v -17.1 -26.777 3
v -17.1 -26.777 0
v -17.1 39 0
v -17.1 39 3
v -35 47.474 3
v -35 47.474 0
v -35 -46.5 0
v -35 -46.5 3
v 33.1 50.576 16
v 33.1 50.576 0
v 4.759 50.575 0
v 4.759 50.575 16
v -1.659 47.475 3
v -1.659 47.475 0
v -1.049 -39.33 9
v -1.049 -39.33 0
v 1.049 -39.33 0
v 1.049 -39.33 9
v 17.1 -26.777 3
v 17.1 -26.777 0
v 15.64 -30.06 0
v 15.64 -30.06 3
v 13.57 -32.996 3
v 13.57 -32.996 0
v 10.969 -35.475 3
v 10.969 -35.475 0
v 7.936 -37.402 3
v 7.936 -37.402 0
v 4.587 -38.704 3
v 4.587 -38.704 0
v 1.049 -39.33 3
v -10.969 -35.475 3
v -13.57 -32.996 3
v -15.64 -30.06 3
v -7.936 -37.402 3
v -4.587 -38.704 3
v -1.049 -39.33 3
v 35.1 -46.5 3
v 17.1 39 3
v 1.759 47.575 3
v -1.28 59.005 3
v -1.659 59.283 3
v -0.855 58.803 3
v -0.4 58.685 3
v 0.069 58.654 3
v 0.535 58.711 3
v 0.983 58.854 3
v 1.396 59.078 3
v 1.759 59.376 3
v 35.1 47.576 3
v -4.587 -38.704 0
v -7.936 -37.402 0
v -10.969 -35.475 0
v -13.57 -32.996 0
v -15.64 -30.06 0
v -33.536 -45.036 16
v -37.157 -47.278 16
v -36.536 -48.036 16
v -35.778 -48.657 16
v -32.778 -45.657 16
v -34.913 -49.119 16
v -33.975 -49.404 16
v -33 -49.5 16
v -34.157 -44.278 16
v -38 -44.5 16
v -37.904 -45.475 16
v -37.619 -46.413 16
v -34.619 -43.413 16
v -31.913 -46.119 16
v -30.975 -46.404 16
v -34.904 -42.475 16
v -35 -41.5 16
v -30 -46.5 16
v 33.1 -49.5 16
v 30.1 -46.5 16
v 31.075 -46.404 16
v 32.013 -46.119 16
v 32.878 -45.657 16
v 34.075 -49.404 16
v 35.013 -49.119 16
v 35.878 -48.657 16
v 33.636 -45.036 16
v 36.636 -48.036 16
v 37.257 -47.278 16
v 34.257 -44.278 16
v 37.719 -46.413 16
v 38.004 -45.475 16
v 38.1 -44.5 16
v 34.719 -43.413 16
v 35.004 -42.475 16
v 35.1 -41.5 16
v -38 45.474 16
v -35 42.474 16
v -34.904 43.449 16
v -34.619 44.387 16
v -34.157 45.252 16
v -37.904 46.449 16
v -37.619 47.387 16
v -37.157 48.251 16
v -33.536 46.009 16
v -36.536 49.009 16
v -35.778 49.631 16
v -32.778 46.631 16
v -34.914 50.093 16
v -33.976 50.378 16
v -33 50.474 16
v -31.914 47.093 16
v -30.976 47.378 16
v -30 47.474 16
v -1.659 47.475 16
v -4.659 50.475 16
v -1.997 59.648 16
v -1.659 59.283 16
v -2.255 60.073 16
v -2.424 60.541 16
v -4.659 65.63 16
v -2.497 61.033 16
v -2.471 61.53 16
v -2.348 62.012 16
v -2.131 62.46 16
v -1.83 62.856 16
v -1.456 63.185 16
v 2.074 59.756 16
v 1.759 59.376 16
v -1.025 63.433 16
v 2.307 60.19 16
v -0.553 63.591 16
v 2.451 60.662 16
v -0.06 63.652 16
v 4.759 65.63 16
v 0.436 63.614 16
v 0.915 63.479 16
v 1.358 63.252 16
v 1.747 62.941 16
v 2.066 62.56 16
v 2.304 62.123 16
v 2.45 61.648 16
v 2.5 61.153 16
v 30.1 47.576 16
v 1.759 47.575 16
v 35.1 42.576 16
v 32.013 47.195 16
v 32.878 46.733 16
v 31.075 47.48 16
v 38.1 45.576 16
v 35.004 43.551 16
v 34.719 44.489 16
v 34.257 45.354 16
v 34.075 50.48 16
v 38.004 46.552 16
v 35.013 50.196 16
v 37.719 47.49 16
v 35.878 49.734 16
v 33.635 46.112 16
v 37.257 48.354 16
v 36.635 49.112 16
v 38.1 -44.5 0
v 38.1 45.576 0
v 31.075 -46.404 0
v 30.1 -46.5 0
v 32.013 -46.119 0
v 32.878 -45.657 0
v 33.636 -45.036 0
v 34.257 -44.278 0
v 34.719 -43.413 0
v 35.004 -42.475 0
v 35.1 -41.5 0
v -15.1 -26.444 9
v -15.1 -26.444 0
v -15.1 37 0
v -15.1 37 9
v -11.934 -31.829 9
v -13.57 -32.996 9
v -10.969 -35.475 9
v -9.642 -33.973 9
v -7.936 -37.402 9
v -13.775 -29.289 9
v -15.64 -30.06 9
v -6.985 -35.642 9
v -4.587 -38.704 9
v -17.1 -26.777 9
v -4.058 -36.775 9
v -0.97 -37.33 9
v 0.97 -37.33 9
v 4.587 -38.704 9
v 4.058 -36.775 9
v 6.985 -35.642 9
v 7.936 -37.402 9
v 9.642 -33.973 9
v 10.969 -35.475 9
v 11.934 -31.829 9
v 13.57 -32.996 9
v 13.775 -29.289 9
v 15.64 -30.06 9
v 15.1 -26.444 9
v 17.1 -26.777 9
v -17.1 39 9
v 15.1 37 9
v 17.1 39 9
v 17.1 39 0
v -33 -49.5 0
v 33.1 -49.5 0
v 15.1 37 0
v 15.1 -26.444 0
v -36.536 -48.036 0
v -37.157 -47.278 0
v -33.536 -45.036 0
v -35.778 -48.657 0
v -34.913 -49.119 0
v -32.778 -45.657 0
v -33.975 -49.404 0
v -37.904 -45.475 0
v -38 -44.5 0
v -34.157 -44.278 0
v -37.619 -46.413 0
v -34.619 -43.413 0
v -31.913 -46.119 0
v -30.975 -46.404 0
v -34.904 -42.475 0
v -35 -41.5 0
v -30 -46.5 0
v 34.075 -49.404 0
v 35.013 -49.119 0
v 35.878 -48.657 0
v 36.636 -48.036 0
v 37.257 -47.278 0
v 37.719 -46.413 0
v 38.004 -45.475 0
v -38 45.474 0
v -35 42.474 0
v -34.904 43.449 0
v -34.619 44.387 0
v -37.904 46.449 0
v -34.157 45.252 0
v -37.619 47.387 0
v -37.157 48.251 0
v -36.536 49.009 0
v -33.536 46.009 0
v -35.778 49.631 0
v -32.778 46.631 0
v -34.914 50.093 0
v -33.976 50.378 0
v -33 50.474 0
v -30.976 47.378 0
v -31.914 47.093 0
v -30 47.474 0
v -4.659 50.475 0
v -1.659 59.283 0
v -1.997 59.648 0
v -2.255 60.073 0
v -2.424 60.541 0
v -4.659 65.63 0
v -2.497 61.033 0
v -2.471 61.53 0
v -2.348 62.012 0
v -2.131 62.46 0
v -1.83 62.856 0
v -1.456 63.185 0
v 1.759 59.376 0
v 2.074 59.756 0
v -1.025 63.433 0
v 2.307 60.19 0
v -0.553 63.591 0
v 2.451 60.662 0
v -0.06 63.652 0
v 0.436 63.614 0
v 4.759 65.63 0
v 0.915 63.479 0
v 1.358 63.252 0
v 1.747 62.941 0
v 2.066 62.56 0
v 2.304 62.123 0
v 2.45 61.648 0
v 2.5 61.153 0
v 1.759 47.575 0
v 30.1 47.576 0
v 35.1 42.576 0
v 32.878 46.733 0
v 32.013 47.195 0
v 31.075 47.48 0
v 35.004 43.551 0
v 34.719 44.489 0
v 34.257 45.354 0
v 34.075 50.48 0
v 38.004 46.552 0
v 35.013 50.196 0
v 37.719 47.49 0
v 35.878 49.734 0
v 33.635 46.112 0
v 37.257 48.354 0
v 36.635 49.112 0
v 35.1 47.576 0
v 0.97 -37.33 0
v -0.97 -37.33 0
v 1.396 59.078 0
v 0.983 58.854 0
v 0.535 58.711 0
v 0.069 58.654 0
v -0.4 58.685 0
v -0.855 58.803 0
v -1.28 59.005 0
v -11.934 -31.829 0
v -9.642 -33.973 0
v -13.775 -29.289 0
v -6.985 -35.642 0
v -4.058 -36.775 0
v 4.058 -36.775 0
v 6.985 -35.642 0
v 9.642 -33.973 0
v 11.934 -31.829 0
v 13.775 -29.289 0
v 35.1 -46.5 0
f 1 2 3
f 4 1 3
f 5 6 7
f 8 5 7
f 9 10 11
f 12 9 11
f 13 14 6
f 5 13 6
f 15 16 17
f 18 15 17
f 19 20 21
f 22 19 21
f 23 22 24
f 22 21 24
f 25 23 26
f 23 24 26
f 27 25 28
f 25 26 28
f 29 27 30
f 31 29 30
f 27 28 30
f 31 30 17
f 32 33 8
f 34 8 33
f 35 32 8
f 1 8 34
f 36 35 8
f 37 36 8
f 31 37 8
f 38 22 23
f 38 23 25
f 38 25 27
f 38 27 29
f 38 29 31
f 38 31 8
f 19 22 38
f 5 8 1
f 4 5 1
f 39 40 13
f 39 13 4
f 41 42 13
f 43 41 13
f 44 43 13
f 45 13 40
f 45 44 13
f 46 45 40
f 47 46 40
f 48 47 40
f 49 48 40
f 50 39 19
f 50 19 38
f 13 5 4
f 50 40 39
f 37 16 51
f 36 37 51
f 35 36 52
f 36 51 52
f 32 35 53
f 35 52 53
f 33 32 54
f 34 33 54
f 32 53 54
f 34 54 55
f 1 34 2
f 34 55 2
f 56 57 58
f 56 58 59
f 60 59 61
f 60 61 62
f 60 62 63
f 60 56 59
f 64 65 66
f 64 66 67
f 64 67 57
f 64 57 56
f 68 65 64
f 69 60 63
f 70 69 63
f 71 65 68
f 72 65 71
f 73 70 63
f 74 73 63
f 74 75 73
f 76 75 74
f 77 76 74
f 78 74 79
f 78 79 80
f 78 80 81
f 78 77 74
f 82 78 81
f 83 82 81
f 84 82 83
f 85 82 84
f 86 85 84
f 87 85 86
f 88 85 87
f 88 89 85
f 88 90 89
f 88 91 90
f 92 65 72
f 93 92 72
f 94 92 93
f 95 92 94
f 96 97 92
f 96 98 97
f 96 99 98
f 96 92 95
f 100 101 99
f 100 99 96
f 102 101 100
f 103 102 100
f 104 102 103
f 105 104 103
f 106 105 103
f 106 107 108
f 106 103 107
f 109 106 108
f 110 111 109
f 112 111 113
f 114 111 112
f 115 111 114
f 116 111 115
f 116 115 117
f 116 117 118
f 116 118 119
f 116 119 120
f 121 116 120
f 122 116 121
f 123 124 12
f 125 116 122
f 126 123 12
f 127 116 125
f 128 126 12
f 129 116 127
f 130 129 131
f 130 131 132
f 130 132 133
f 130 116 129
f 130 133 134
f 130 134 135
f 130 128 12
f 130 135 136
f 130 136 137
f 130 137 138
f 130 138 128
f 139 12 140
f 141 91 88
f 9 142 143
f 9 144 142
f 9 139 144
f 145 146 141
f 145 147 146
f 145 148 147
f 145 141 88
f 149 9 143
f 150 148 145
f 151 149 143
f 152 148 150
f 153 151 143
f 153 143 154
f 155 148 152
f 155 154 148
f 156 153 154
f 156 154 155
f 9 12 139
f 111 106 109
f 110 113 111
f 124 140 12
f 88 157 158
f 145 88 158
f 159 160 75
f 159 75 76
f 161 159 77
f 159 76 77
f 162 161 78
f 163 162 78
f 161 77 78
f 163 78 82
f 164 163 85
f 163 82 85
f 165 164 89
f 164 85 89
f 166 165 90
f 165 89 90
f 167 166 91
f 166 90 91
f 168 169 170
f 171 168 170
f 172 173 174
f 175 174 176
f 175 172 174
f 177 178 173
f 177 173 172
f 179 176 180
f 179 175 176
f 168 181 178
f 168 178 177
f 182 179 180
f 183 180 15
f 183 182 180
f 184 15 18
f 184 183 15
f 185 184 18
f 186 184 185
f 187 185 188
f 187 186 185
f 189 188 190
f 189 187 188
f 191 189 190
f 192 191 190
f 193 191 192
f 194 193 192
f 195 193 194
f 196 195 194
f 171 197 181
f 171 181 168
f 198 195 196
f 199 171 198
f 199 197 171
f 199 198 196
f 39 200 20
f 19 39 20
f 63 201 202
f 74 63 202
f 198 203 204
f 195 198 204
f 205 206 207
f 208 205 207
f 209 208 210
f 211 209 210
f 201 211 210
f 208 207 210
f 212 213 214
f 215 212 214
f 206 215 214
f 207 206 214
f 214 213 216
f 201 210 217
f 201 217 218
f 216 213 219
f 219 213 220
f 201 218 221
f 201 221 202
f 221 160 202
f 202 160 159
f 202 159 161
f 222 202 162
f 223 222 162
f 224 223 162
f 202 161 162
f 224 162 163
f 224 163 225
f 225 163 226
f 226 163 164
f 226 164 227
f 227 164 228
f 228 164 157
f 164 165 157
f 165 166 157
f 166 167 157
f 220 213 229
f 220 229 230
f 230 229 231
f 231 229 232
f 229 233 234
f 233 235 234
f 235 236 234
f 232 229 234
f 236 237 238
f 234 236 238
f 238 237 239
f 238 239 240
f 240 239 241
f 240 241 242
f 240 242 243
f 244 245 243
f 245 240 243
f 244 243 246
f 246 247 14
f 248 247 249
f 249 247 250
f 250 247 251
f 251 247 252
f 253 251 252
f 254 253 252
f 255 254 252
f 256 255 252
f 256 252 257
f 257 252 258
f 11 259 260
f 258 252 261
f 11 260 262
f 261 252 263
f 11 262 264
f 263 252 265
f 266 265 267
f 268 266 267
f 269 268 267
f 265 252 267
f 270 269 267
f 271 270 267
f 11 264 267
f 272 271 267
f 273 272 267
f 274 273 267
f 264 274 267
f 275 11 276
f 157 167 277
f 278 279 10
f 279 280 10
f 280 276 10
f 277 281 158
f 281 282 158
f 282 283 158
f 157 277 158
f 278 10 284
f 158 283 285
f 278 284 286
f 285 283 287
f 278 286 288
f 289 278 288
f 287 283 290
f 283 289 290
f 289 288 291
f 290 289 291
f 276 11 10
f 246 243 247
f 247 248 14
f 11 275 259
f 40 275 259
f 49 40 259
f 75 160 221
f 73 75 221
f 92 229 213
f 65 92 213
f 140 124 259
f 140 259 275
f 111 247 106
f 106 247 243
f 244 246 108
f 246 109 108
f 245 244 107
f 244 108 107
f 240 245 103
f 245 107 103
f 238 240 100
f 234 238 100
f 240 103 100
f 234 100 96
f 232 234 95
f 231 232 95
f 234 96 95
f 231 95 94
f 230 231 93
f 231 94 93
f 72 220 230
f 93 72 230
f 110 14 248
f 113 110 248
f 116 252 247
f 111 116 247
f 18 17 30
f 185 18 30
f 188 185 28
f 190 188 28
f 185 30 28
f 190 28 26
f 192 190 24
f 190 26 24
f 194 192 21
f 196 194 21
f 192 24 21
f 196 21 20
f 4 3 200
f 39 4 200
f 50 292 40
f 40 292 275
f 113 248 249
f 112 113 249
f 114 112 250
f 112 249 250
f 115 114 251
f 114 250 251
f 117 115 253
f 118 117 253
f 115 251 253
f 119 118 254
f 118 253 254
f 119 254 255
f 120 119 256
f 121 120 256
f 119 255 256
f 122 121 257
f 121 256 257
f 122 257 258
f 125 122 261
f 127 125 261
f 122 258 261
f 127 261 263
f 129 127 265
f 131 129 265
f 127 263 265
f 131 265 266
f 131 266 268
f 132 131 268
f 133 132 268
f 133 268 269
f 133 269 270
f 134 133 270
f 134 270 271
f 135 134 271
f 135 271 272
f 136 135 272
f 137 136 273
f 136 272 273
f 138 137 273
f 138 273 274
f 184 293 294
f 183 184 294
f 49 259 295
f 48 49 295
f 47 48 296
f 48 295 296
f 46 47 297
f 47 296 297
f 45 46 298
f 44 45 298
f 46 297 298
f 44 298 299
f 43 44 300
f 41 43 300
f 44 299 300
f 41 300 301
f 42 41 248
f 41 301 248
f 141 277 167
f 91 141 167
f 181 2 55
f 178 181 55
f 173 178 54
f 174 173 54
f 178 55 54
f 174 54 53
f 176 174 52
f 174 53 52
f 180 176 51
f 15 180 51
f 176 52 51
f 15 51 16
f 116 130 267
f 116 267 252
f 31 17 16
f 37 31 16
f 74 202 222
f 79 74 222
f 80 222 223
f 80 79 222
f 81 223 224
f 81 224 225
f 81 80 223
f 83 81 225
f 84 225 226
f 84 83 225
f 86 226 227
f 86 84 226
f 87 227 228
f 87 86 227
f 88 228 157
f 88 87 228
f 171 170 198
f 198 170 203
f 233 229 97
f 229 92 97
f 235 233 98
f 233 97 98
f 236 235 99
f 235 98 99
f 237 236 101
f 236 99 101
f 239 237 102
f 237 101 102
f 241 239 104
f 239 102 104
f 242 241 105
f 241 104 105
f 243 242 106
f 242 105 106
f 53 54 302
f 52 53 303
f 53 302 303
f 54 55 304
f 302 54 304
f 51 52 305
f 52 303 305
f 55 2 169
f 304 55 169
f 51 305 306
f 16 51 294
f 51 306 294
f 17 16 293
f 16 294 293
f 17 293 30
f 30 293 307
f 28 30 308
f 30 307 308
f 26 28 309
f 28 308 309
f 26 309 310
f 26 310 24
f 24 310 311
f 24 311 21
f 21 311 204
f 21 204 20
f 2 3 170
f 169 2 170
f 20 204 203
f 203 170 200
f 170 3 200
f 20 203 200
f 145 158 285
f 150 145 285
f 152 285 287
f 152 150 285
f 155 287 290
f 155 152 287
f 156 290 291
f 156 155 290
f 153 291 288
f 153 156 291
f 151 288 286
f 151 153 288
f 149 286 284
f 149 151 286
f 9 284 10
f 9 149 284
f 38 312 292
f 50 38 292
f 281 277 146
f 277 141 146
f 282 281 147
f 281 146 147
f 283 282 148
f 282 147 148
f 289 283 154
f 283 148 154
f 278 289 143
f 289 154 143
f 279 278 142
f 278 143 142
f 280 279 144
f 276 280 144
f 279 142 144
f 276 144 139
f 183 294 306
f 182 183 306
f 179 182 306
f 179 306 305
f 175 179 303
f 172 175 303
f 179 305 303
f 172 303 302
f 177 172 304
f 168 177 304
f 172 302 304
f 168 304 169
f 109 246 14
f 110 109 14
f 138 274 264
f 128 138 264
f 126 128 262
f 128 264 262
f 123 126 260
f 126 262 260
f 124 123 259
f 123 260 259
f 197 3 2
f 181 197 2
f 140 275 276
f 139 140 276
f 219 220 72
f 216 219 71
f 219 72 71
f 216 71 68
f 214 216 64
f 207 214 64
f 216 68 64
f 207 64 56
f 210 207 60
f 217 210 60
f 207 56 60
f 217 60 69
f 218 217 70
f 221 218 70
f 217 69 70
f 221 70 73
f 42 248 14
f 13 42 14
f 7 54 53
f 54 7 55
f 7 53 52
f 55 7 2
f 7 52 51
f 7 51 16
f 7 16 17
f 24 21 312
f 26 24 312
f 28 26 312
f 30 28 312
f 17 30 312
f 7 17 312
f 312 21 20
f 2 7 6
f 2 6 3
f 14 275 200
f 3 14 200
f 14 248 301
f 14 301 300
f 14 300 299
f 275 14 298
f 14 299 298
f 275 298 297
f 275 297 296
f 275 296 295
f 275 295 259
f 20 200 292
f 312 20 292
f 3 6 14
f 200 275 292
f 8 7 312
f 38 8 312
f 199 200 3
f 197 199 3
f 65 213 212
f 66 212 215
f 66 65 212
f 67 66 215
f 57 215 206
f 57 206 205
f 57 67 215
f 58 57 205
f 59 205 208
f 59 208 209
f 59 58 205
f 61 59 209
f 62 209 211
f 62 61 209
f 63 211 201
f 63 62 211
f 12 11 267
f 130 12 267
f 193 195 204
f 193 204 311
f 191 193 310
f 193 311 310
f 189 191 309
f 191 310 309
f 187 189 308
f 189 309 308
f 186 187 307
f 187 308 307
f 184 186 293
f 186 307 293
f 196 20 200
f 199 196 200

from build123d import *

# Parameters (mm, degrees)
F1_DEPTH = 16
F2_DEPTH = 9
F3_DEPTH = 3
F4_R     = 5


with BuildPart() as f1:
    # F0 (on Top) → F1 (new body)
    with BuildSketch(Plane.XY):
        Polygon((-38, 50.473494), (-38, -49.5), (38.100001, -49.5), (38.100001, 50.576335), (4.759095, 50.574917), (4.759095, 65.630205), (-4.659094, 65.630205), (-4.659094, 50.474911), align=None)
        with BuildLine():
            ThreePointArc((-1.659094, 59.282516), (-1.025248, 63.432754), (2.5, 61.152652))
            ThreePointArc((2.5, 61.152652), (2.307351, 60.190295), (1.759095, 59.376255))
            Line((1.759095, 59.376255), (1.759095, 47.574789))
            Line((1.759095, 47.574789), (35.100001, 47.576207))
            Line((35.100001, 47.576207), (35.100001, -46.5))
            Line((35.100001, -46.5), (-35, -46.5))
            Line((-35, -46.5), (-35, 47.473621))
            Line((-35, 47.473621), (-1.659094, 47.475039))
            Line((-1.659094, 47.475039), (-1.659094, 59.282516))
        make_face(mode=Mode.SUBTRACT)
    extrude(amount=F1_DEPTH)

    # F4
    f4_edges = [f1.edges().sort_by_distance(p)[0] for p in [
        (-38, 50.473494, 8),
        (-38, -49.5, 8),
        (38.100001, -49.5, 8),
        (38.100001, 50.576335, 8),
        (35.100001, 47.576207, 8),
        (-35, 47.473621, 8),
        (35.100001, -46.5, 8),
        (-35, -46.5, 8),
    ]]
    fillet(f4_edges, radius=F4_R)


with BuildPart() as f2:
    # F0 (on Top) → F2 (new body)
    with BuildSketch(Plane.XY):
        with BuildLine():
            Line((17.100001, 39), (-17.100001, 39))
            Line((-17.100001, 39), (-17.100001, -26.776899))
            ThreePointArc((-17.100001, -26.776899), (-10.968907, -35.47542), (-1.04936, -39.329919))
            Line((-1.04936, -39.329919), (1.04936, -39.329919))
            ThreePointArc((1.04936, -39.329919), (10.968907, -35.47542), (17.100001, -26.776899))
            Line((17.100001, -26.776899), (17.100001, 39))
        make_face()
        with BuildLine():
            Line((-15.100001, -26.443695), (-15.100001, 37))
            Line((-15.100001, 37), (15.100001, 37))
            Line((15.100001, 37), (15.100001, -26.443695))
            ThreePointArc((15.100001, -26.443695), (9.642296, -33.973369), (0.969573, -37.329919))
            Line((0.969573, -37.329919), (-0.969573, -37.329919))
            ThreePointArc((-0.969573, -37.329919), (-9.642296, -33.973369), (-15.100001, -26.443695))
        make_face(mode=Mode.SUBTRACT)
    extrude(amount=F2_DEPTH)


with BuildPart() as f3:
    # F0 (on Top) → F3 (new body)
    with BuildSketch(Plane.XY):
        with BuildLine():
            ThreePointArc((1.759095, 59.376255), (0.068533, 58.653591), (-1.659094, 59.282516))
            Line((-1.659094, 59.282516), (-1.659094, 47.475039))
            Line((-1.659094, 47.475039), (-35, 47.473621))
            Line((-35, 47.473621), (-35, -46.5))
            Line((-35, -46.5), (35.100001, -46.5))
            Line((35.100001, -46.5), (35.100001, 47.576207))
            Line((35.100001, 47.576207), (1.759095, 47.574789))
            Line((1.759095, 47.574789), (1.759095, 59.376255))
        make_face()
        with BuildLine():
            Line((-17.100001, -26.776899), (-17.100001, 39))
            Line((-17.100001, 39), (17.100001, 39))
            Line((17.100001, 39), (17.100001, -26.776899))
            ThreePointArc((17.100001, -26.776899), (10.968907, -35.47542), (1.04936, -39.329919))
            Line((1.04936, -39.329919), (-1.04936, -39.329919))
            ThreePointArc((-1.04936, -39.329919), (-10.968907, -35.47542), (-17.100001, -26.776899))
        make_face(mode=Mode.SUBTRACT)
    extrude(amount=F3_DEPTH)


solid = Compound([f1.part, f2.part, f3.part])
